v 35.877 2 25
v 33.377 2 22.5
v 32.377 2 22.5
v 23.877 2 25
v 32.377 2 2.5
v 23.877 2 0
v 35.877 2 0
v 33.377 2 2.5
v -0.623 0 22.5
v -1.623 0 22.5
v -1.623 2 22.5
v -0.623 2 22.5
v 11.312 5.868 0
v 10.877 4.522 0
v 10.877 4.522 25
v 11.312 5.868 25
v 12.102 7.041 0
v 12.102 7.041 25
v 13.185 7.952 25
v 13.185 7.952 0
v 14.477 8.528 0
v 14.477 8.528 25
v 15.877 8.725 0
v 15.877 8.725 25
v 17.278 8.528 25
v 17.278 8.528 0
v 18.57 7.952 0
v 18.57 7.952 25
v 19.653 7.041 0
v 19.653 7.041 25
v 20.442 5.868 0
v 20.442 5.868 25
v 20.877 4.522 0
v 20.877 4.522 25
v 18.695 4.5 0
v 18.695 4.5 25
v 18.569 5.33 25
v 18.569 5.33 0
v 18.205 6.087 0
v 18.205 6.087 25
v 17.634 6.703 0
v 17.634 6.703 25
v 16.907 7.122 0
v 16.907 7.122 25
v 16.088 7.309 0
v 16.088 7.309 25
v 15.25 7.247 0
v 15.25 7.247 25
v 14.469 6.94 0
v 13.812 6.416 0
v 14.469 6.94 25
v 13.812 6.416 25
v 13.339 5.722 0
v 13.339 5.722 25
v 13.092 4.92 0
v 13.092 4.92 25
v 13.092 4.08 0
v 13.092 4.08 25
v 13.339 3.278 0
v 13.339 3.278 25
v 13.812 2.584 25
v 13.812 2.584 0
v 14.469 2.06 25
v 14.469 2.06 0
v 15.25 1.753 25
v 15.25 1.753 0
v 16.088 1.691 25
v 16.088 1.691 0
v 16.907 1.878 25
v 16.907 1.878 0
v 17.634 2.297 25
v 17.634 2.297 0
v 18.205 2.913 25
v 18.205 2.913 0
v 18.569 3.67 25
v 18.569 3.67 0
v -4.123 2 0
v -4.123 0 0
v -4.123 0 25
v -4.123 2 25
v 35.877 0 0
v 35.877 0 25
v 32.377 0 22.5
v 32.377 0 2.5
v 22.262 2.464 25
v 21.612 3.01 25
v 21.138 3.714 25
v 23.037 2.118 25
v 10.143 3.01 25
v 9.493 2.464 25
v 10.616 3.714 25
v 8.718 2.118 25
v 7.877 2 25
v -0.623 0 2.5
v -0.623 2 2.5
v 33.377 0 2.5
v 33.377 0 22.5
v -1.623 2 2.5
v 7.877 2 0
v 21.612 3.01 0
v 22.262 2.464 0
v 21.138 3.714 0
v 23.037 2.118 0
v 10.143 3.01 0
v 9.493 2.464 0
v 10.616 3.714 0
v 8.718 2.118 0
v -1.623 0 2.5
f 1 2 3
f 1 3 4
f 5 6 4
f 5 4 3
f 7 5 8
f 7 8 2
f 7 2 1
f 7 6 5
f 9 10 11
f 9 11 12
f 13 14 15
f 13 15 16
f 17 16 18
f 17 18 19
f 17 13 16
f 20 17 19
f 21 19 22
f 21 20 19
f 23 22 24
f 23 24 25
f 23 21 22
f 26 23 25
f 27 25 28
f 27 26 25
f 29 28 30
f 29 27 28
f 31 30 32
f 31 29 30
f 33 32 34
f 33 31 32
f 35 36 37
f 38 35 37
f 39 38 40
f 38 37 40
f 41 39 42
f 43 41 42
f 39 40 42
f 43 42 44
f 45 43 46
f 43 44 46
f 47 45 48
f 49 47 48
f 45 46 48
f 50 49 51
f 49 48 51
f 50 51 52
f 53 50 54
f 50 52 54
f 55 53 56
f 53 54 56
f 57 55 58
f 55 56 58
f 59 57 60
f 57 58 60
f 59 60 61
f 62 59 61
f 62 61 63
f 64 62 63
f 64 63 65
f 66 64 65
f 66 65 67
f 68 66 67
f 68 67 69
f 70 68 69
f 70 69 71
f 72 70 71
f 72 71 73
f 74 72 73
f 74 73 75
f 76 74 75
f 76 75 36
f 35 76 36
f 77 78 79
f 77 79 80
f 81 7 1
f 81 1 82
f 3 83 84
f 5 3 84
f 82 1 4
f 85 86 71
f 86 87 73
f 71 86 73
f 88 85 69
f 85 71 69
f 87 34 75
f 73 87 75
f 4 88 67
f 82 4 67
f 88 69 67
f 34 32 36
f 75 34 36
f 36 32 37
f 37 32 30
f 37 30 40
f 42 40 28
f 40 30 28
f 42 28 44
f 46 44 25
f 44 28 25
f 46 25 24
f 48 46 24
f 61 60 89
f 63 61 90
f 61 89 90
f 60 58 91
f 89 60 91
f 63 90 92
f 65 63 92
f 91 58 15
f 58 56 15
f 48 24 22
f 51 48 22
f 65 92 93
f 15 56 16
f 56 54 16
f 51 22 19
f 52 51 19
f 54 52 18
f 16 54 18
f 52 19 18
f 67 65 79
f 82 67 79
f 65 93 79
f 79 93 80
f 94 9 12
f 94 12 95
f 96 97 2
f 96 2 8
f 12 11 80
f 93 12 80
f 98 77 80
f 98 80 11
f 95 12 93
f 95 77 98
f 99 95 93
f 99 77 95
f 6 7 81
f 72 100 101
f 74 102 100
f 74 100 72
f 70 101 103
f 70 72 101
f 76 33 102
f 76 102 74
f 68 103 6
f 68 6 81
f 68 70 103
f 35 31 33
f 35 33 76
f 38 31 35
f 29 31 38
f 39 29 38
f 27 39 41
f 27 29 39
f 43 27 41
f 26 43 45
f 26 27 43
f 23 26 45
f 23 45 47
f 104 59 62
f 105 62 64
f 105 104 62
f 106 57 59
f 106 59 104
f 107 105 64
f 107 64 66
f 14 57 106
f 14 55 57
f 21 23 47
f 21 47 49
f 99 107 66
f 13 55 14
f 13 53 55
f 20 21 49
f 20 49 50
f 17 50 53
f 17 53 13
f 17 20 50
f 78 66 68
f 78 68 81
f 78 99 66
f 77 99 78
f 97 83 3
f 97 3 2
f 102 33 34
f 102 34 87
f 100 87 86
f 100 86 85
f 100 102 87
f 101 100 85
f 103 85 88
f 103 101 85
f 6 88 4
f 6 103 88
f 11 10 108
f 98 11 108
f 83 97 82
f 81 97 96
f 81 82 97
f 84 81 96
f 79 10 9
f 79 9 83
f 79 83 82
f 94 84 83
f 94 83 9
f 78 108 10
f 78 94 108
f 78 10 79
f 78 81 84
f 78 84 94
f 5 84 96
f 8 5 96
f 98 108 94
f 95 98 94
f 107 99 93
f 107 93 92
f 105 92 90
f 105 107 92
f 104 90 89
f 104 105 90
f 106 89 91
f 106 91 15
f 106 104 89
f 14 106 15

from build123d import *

# Parameters (mm, degrees)
BOSS_EXTRUDE2_DEPTH = 25
SKETCH3_W           = 1
SKETCH3_H           = 20
CUT_EXTRUDE2_DEPTH  = 5
SKETCH4_R           = 2.817174782
CUT_EXTRUDE3_DEPTH  = 36


with BuildPart() as part:
    # Sketch1 → Boss-Extrude2 (new body)
    with BuildSketch(Plane.XY):
        with BuildLine():
            Line((-4.122666018, 0), (-4.122666018, 2))
            Line((-4.122666018, 2), (7.877333982, 2))
            ThreePointArc((7.877333982, 2), (9.83688299, 2.714187595), (10.877333982, 4.521771056))
            ThreePointArc((10.877333982, 4.521771056), (15.877333982, 8.724722816), (20.877333982, 4.521771056))
            ThreePointArc((20.877333982, 4.521771056), (21.917784974, 2.714187595), (23.877333982, 2))
            Line((23.877333982, 2), (35.877333982, 2))
            Line((35.877333982, 2), (35.877333982, 0))
            Line((35.877333982, 0), (-4.122666018, 0))
        make_face()
    extrude(amount=BOSS_EXTRUDE2_DEPTH)

    # Sketch3 → Cut-Extrude2 (cut)
    with BuildSketch(Plane(origin=(0, 0, 0), x_dir=(1, 0, 0), z_dir=(0, 1, 0))):
        with Locations((-1.122666018, -12.5)):
            Rectangle(SKETCH3_W, SKETCH3_H)
        with Locations((32.877333982, -12.5)):
            Rectangle(SKETCH3_W, SKETCH3_H)
    extrude(amount=CUT_EXTRUDE2_DEPTH, mode=Mode.SUBTRACT)

    # Sketch4 → Cut-Extrude3 (cut)
    with BuildSketch(Plane.XY.offset(25)):
        with Locations((15.877333982, 4.5)):
            Circle(SKETCH4_R)
    extrude(amount=-CUT_EXTRUDE3_DEPTH, mode=Mode.SUBTRACT)


solid = part.part
